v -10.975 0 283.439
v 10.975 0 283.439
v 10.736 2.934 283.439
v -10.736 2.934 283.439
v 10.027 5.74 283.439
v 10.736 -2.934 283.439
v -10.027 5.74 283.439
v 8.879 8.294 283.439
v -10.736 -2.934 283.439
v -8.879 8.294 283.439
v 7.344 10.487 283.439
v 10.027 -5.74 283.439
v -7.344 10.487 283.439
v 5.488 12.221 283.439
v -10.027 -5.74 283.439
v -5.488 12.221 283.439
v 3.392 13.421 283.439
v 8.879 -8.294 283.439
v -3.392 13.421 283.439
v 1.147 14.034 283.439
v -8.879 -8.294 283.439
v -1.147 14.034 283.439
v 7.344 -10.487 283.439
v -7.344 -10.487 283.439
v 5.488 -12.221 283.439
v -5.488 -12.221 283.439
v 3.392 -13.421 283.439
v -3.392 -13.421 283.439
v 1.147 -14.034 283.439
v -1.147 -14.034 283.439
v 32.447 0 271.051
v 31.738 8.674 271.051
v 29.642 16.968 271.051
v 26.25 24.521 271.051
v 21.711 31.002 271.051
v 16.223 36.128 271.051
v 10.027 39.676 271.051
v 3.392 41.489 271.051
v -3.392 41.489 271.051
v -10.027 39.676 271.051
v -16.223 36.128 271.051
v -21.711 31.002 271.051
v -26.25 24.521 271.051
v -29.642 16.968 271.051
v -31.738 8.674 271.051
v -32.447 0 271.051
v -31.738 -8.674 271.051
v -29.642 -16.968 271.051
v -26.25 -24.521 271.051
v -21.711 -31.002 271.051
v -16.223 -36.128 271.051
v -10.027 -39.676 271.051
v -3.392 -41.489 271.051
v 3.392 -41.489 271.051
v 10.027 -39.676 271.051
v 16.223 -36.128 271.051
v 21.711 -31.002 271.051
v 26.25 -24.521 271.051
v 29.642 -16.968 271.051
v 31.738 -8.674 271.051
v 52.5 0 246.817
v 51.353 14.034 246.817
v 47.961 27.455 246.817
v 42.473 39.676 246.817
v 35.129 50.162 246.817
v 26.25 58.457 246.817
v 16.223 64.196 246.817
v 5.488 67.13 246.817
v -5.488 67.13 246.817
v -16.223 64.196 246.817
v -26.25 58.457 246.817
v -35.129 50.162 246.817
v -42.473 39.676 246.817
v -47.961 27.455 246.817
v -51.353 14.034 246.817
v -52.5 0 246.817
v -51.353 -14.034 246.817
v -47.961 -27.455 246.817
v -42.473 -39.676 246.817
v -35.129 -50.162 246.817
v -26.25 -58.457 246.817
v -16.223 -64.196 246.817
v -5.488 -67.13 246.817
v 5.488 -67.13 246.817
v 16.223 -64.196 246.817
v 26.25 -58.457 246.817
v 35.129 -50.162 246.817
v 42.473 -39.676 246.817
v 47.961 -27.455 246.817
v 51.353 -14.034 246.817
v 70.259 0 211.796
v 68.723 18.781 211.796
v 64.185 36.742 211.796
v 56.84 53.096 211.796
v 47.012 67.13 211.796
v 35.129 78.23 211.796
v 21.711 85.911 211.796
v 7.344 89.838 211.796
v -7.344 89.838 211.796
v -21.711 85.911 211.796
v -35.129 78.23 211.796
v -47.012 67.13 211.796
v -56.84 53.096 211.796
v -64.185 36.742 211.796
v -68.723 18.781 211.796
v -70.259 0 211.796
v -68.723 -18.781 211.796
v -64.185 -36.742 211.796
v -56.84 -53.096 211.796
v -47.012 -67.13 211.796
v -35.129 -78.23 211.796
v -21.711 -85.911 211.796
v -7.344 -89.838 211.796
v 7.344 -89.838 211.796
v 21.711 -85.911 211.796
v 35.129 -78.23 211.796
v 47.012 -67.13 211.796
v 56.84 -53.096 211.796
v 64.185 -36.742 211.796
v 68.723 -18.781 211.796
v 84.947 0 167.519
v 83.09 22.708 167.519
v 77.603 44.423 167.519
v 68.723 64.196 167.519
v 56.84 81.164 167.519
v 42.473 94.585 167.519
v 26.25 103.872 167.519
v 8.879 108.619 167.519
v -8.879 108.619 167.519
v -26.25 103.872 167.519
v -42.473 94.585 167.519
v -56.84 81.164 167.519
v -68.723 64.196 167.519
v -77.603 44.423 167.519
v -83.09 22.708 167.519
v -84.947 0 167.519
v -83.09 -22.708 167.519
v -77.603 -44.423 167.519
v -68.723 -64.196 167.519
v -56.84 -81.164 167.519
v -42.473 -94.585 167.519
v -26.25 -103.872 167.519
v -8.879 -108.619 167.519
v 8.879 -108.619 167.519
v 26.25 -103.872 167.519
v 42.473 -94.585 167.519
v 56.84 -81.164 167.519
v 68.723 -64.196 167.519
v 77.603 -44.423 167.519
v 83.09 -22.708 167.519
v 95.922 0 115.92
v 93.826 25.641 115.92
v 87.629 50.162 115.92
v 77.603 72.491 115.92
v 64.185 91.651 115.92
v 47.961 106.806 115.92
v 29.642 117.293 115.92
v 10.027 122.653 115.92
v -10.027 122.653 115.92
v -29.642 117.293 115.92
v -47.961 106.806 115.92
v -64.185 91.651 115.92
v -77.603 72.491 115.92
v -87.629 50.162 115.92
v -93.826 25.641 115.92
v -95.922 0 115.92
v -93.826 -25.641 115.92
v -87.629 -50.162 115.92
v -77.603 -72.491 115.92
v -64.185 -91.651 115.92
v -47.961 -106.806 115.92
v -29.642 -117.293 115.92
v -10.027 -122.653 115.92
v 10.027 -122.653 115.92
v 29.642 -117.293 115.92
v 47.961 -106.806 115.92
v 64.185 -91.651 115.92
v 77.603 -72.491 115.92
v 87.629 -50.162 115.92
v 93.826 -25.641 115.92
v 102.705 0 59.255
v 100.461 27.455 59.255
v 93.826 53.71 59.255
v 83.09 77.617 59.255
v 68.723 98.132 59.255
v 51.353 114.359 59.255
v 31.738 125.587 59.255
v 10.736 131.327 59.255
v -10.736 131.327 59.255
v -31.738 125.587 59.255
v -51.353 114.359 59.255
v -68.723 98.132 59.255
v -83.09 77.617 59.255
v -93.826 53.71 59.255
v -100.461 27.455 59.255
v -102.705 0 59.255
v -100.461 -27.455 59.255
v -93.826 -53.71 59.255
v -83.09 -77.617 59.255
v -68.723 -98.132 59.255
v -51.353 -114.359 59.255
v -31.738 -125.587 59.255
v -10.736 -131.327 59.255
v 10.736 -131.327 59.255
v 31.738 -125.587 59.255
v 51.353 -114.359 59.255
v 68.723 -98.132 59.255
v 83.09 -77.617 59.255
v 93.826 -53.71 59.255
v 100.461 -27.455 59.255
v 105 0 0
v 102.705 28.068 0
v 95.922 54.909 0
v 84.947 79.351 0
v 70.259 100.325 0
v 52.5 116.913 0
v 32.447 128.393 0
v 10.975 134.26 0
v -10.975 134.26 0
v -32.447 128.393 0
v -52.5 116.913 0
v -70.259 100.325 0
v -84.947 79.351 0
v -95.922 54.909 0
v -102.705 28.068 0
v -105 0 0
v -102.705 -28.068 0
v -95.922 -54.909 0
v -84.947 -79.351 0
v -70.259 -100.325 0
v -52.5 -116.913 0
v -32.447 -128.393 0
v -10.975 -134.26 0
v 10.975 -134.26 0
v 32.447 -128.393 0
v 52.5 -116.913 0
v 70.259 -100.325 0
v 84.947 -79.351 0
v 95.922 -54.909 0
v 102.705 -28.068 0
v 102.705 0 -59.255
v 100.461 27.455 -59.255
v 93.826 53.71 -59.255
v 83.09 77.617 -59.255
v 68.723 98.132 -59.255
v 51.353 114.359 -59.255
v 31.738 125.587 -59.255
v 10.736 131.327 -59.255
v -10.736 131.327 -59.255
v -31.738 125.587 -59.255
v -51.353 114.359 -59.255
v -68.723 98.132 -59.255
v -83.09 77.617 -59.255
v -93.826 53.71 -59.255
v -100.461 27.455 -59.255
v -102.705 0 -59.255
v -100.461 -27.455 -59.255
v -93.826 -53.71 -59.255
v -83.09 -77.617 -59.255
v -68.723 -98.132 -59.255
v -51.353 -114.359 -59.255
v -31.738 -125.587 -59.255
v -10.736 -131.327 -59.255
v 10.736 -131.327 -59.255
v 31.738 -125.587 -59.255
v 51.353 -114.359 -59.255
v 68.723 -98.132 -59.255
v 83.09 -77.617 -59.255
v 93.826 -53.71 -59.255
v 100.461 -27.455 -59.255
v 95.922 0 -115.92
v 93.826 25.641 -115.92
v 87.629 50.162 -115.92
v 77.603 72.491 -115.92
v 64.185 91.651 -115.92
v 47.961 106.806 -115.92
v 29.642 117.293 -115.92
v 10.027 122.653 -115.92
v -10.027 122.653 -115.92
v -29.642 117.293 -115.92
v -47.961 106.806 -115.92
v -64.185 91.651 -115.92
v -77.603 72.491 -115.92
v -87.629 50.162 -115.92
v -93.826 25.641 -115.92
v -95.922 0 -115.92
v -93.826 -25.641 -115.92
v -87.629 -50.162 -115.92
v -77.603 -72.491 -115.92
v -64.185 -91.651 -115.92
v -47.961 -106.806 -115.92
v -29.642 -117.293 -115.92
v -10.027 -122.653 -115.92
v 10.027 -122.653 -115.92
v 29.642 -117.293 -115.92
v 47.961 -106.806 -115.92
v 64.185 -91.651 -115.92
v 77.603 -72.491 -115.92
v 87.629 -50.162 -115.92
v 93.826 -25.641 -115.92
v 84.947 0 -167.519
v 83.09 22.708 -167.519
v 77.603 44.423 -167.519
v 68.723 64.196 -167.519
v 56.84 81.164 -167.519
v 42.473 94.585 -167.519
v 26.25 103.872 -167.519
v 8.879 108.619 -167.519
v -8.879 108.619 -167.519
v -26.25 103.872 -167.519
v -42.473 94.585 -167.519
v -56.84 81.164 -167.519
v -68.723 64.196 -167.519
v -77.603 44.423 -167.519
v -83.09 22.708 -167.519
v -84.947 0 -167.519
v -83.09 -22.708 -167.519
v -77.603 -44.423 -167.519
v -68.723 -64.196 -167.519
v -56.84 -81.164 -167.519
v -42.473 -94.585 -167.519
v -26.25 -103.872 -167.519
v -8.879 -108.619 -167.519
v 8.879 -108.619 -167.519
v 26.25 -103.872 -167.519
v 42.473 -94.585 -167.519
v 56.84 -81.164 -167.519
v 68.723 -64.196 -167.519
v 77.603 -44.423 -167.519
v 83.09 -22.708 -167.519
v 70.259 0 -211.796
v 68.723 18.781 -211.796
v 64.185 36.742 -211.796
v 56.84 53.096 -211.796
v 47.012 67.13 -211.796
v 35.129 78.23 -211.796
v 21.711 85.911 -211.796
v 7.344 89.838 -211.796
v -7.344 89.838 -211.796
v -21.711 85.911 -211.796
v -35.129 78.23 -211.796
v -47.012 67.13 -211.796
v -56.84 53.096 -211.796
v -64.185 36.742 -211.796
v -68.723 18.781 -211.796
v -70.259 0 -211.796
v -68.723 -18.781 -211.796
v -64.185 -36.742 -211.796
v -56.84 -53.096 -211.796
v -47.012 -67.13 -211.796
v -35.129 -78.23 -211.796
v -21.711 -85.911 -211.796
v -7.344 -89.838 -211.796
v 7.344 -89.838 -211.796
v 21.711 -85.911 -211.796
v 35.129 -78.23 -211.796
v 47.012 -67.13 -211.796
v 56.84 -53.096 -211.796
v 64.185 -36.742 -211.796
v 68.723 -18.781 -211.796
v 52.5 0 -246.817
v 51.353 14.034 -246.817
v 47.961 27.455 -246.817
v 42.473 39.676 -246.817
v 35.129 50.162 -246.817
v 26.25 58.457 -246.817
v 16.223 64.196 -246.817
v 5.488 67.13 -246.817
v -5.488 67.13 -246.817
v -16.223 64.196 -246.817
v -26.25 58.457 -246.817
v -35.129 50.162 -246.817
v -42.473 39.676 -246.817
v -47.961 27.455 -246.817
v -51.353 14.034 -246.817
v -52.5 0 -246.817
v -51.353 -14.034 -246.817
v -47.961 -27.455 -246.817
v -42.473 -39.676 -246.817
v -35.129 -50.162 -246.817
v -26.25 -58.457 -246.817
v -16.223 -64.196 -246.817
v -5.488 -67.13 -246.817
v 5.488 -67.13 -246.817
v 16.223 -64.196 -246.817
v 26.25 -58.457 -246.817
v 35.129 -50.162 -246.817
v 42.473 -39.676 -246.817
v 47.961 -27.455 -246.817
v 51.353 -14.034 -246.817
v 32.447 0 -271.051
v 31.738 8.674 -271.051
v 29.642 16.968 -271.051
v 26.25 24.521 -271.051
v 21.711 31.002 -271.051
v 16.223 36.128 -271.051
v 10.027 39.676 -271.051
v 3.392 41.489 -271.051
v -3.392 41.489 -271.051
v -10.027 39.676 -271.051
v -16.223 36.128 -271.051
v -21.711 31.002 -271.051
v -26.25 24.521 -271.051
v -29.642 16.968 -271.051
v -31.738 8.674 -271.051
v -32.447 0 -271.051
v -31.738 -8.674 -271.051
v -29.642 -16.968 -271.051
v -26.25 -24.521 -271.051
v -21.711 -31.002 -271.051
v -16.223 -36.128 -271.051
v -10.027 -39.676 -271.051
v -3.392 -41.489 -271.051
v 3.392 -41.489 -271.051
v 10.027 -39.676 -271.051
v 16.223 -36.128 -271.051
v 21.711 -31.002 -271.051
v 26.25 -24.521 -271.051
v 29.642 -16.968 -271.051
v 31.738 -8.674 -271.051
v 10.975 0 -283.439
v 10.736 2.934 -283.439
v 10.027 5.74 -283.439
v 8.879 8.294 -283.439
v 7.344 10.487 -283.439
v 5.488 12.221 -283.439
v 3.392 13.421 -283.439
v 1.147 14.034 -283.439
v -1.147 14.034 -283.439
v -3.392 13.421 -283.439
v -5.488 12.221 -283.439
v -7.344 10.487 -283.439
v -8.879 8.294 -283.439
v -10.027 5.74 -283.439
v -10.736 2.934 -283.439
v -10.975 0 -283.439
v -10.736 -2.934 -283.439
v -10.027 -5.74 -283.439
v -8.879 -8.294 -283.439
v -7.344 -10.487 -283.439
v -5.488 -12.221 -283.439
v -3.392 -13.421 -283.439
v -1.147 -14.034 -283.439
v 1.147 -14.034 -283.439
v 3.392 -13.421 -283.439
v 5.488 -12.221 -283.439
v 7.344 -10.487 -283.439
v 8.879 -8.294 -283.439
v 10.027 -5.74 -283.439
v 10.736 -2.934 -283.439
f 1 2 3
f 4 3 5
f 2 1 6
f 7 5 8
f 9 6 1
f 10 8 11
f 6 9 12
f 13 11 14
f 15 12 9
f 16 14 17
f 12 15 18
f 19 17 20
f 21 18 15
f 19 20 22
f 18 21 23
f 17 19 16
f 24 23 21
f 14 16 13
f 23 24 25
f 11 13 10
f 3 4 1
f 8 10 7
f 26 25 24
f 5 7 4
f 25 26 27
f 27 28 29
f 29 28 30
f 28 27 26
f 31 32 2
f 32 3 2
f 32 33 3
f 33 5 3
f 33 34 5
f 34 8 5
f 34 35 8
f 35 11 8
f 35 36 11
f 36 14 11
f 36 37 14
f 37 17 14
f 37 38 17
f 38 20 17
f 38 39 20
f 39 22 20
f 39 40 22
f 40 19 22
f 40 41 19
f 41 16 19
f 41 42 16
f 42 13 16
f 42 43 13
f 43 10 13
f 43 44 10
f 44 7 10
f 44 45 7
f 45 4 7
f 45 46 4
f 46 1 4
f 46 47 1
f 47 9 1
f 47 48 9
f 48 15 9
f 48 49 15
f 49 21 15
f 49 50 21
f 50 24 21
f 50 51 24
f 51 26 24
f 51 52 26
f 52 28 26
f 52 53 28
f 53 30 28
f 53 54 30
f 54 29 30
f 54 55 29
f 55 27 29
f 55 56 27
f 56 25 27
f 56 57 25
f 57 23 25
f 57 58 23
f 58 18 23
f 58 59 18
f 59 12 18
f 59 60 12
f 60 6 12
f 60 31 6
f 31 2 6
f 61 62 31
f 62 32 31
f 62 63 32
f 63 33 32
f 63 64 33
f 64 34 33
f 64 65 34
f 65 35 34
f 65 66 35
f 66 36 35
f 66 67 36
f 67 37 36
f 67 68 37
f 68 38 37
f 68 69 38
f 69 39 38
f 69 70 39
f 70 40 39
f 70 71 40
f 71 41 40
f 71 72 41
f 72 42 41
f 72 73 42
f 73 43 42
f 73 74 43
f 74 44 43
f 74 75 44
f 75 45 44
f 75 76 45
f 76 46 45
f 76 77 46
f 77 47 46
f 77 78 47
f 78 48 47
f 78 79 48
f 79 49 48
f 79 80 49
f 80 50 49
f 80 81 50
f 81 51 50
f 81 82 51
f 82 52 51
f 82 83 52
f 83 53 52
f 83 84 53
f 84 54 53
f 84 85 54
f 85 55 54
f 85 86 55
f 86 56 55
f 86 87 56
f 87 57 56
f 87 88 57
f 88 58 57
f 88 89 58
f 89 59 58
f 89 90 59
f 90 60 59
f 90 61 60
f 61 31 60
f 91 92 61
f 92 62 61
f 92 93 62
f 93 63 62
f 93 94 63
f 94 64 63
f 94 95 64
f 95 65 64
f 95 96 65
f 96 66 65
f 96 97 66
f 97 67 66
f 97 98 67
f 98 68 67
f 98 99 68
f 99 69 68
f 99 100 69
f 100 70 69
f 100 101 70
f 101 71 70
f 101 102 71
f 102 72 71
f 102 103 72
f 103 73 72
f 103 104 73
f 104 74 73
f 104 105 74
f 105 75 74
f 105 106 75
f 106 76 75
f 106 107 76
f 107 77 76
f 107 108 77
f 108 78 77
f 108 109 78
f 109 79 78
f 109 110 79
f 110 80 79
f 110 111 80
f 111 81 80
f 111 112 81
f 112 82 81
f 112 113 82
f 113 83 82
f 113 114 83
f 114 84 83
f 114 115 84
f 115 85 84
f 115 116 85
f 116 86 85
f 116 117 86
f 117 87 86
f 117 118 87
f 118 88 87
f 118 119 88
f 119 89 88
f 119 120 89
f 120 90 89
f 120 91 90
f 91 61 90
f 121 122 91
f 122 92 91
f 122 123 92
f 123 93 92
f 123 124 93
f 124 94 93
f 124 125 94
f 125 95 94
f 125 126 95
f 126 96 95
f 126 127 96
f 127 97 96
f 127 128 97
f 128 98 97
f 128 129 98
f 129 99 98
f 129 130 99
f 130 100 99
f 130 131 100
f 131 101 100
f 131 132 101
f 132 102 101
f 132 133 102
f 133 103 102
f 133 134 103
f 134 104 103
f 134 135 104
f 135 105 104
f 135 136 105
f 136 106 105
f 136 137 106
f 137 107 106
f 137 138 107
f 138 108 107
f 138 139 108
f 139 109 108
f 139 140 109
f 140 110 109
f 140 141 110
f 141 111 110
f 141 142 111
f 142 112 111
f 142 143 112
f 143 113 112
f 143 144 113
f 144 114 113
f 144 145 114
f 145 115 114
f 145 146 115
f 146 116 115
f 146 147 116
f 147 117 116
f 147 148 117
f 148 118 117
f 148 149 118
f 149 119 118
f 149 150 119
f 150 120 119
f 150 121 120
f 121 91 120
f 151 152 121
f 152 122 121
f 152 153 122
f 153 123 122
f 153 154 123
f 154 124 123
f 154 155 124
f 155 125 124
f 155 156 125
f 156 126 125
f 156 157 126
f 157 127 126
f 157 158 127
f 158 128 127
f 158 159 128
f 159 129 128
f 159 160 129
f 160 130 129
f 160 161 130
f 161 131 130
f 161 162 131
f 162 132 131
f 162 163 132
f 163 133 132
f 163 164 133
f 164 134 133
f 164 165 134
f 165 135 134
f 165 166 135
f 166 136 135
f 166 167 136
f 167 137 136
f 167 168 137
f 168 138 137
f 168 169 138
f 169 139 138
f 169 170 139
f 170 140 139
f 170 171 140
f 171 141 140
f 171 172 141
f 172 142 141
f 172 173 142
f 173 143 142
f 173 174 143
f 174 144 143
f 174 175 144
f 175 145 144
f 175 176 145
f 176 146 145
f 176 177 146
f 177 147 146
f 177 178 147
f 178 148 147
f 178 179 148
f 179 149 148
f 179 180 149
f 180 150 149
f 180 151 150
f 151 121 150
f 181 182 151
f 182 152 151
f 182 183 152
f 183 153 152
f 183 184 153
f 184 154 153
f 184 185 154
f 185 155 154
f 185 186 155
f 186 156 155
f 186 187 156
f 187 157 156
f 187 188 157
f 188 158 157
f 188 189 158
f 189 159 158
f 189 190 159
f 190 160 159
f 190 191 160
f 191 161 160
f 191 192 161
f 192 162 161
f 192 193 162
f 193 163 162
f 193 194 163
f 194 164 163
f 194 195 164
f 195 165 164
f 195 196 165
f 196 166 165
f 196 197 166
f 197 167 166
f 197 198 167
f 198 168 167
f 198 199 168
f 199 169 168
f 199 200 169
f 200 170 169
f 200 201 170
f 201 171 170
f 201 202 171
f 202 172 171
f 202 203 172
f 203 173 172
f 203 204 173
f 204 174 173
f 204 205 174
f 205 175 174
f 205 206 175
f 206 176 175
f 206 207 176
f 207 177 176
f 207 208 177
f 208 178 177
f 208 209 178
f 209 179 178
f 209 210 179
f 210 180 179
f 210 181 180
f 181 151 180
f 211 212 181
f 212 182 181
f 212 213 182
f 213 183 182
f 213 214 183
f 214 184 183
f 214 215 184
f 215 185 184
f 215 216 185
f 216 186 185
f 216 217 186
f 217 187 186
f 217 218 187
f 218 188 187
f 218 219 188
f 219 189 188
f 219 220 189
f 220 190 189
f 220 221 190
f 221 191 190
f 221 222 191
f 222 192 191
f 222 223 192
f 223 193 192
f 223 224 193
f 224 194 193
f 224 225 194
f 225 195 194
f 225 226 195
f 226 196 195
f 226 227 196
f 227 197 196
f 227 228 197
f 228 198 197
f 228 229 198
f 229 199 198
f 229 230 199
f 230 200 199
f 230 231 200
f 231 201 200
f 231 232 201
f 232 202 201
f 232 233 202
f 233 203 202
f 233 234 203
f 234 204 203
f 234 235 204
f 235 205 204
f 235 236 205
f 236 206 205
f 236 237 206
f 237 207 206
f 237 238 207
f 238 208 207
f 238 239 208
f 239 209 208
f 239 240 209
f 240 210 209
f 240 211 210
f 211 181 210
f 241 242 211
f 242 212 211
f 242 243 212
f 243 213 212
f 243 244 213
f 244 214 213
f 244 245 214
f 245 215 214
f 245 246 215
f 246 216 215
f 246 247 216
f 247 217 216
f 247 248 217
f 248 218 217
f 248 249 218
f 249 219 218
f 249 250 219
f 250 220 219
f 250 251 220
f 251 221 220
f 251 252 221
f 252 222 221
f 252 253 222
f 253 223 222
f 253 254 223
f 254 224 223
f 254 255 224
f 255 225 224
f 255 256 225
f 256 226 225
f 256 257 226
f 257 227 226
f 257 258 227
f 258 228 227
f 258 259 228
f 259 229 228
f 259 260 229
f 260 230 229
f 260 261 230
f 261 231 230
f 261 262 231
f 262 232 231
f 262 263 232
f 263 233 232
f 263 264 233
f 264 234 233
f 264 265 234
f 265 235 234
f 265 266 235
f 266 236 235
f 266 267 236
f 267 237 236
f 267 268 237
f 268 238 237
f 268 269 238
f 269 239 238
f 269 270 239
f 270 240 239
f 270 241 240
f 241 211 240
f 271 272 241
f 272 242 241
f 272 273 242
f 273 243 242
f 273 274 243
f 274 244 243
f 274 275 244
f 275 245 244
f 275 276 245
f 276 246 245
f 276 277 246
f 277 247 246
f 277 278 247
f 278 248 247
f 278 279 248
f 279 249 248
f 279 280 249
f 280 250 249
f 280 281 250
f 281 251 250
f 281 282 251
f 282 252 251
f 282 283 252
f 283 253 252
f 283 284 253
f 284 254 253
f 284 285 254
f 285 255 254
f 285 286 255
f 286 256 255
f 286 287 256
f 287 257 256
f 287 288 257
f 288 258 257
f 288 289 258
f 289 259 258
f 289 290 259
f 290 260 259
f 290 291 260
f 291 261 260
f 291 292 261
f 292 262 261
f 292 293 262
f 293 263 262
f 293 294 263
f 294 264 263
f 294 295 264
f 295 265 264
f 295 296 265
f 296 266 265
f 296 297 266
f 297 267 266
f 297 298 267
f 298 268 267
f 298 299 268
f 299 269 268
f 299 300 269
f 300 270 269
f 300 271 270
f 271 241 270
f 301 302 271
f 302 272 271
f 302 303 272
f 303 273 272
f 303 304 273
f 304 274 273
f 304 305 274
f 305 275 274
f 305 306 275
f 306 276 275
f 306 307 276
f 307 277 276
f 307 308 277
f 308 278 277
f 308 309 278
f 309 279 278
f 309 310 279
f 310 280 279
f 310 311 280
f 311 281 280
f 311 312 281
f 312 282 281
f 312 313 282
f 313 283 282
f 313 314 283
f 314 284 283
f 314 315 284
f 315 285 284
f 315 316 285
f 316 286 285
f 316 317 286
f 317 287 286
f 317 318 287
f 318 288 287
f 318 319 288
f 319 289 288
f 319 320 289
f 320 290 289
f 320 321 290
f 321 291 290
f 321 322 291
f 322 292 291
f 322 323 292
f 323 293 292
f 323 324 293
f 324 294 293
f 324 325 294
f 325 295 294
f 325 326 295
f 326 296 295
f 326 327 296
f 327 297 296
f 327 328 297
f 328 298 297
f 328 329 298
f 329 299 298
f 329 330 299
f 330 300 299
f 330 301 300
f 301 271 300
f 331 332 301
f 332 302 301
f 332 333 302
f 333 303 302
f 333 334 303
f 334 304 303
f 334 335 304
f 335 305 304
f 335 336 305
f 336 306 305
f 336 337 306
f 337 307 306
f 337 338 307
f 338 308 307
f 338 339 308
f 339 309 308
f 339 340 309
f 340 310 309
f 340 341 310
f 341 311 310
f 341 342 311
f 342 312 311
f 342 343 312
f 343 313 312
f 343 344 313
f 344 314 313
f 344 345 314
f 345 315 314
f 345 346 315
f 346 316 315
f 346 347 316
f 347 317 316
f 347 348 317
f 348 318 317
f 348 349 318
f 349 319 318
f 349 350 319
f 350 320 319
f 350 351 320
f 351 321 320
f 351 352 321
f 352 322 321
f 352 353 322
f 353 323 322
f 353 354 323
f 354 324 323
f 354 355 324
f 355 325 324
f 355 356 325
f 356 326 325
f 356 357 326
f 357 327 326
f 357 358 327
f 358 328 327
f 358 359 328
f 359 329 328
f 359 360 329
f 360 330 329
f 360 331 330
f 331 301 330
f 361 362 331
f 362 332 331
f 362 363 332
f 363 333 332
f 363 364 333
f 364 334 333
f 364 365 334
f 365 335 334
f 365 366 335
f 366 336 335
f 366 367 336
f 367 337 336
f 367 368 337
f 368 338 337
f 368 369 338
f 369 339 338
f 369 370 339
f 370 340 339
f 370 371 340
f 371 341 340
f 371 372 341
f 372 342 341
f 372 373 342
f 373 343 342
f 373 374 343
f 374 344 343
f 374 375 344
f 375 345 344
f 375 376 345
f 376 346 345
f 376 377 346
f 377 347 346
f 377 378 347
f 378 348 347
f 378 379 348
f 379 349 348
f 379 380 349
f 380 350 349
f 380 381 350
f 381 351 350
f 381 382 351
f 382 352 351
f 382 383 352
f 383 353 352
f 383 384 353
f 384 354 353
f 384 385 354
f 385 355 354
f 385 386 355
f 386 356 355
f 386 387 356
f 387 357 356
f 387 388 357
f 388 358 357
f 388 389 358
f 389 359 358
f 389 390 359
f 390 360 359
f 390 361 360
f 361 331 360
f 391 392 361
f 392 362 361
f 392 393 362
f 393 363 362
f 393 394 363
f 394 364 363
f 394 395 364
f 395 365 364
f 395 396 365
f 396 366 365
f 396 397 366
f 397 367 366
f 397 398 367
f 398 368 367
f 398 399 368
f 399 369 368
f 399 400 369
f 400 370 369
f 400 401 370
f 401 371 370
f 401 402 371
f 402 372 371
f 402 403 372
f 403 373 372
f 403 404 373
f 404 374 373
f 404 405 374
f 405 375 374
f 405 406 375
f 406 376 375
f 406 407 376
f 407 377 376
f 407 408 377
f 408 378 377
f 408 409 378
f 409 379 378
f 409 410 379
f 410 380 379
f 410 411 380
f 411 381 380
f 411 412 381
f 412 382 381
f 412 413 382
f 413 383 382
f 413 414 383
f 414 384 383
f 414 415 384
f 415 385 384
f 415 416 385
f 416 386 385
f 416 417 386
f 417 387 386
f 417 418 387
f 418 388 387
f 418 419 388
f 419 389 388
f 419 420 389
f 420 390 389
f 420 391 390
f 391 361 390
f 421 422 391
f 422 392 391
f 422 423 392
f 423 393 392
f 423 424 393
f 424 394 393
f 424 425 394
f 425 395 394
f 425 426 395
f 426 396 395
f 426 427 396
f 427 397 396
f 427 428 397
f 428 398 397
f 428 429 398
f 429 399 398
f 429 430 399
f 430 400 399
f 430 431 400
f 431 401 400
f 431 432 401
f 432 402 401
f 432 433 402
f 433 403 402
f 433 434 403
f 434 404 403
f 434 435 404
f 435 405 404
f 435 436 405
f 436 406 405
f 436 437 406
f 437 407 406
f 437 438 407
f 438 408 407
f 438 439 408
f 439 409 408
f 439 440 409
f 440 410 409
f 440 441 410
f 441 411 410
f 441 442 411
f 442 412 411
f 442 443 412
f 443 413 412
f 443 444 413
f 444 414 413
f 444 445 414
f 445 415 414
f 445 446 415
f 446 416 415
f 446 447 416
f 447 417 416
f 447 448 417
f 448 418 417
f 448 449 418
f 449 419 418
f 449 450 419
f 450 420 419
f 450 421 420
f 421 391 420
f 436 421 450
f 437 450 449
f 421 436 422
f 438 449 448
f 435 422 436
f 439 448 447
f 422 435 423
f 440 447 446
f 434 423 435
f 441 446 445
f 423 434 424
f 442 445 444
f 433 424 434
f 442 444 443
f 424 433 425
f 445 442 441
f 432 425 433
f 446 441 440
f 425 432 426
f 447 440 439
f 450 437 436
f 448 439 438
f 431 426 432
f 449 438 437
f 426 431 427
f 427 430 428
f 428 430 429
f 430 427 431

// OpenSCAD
// Generated by SolidPython 1.0.1 on 2020-07-29 00:46:47


scale(v = [7, 9, 19]) {
	sphere(r = 15);
}
/***********************************************
*********      SolidPython code:      **********
************************************************
 
# import packages: SolidPython
from solid import *
from solid.utils import *
from itertools import chain, combinations, permutations


class Resize:

    def __init__(self, scad_file):
        self.scad_file = scad_file
        #self.scad_file = import_scad(scad_file)
        # cone/cylinder param:
        self.r1 = 0
        self.r2 = 0
        self.h = 0
        # rectangular prism param:
        self.w = 0
        self.l = 0
        # ellipse param:
        self.r = 0

    # import OpenScad code (file name corresponds to shape)


    # classify shape + parameters
    def assign(self, param1, param2, param3):
        if self.scad_file == 'cone.scad':
            self.r1 = param1
            self.r2 = param2
            self.h = param3
        elif self.scad_file == 'cylinder.scad':
            self.r1 = param1
            self.r2 = param2
            self.h = param3
        elif self.scad_file == 'rectangularPrism.scad':
            self.h = param1
            self.l = param2
            self.w = param3
        else:
            self.r = param1
            self.h = param2

    # resize parameters
    def iterate(self):
        x = range(3, 20, 2)
        i = 1
        if self.scad_file == 'cone.scad':
            tempList = list(permutations(x, 2))
            for temp in tempList:
                param1 = temp[0]
                param2 = temp[1]
                filepath = 'produced_scad_files/' + 'cone' + str(param1) + '_' + str(param2) + '_' + '.scad'
                scad_render_to_file(cylinder(h=param1, r1=param2, r2=0), filepath)

        elif self.scad_file == 'cylinder.scad':
            tempList = list(permutations(x, 3))
            for temp in tempList:
                param1 = temp[0]
                param2 = temp[1]
                filepath = 'produced_scad_files/' + 'cylinder' + str(param1) + '_' + str(param2) + '_' + '.scad'
                scad_render_to_file(cylinder(h=param1, r1=param2, r2=param2), filepath)

        elif self.scad_file == 'rectangularPrism.scad':
            tempList = list(permutations(x, 3))
            for temp in tempList:
                param1 = temp[0]
                param2 = temp[1]
                param3 = temp[2]
                filepath = 'produced_scad_files/' + 'rectangularPrism' + str(param1) + '_' + str(param2) + '_' + str(
                    param3) + '.scad'
                scad_render_to_file(cube(size=(param1, param2, param3)), filepath)

        elif self.scad_file == 'ellipse.scad':
            tempList = list(permutations(x, 4))
            for temp in tempList:
                param1 = temp[0]
                param2 = temp[1]
                param3 = temp[2]
                param4 = temp[3]
                filepath = 'produced_scad_files/' + 'ellipse' + str(param1) + '_' + str(param2) + '_' + str(param3) + '_' + str(param4) + '.scad'
                scad_render_to_file(scale([param1, param2, param3])(sphere(r=param4)), filepath)

    def render_to_scadfile(self):
        scad_render_to_file(scad, 'example.scad') 
 
************************************************/
